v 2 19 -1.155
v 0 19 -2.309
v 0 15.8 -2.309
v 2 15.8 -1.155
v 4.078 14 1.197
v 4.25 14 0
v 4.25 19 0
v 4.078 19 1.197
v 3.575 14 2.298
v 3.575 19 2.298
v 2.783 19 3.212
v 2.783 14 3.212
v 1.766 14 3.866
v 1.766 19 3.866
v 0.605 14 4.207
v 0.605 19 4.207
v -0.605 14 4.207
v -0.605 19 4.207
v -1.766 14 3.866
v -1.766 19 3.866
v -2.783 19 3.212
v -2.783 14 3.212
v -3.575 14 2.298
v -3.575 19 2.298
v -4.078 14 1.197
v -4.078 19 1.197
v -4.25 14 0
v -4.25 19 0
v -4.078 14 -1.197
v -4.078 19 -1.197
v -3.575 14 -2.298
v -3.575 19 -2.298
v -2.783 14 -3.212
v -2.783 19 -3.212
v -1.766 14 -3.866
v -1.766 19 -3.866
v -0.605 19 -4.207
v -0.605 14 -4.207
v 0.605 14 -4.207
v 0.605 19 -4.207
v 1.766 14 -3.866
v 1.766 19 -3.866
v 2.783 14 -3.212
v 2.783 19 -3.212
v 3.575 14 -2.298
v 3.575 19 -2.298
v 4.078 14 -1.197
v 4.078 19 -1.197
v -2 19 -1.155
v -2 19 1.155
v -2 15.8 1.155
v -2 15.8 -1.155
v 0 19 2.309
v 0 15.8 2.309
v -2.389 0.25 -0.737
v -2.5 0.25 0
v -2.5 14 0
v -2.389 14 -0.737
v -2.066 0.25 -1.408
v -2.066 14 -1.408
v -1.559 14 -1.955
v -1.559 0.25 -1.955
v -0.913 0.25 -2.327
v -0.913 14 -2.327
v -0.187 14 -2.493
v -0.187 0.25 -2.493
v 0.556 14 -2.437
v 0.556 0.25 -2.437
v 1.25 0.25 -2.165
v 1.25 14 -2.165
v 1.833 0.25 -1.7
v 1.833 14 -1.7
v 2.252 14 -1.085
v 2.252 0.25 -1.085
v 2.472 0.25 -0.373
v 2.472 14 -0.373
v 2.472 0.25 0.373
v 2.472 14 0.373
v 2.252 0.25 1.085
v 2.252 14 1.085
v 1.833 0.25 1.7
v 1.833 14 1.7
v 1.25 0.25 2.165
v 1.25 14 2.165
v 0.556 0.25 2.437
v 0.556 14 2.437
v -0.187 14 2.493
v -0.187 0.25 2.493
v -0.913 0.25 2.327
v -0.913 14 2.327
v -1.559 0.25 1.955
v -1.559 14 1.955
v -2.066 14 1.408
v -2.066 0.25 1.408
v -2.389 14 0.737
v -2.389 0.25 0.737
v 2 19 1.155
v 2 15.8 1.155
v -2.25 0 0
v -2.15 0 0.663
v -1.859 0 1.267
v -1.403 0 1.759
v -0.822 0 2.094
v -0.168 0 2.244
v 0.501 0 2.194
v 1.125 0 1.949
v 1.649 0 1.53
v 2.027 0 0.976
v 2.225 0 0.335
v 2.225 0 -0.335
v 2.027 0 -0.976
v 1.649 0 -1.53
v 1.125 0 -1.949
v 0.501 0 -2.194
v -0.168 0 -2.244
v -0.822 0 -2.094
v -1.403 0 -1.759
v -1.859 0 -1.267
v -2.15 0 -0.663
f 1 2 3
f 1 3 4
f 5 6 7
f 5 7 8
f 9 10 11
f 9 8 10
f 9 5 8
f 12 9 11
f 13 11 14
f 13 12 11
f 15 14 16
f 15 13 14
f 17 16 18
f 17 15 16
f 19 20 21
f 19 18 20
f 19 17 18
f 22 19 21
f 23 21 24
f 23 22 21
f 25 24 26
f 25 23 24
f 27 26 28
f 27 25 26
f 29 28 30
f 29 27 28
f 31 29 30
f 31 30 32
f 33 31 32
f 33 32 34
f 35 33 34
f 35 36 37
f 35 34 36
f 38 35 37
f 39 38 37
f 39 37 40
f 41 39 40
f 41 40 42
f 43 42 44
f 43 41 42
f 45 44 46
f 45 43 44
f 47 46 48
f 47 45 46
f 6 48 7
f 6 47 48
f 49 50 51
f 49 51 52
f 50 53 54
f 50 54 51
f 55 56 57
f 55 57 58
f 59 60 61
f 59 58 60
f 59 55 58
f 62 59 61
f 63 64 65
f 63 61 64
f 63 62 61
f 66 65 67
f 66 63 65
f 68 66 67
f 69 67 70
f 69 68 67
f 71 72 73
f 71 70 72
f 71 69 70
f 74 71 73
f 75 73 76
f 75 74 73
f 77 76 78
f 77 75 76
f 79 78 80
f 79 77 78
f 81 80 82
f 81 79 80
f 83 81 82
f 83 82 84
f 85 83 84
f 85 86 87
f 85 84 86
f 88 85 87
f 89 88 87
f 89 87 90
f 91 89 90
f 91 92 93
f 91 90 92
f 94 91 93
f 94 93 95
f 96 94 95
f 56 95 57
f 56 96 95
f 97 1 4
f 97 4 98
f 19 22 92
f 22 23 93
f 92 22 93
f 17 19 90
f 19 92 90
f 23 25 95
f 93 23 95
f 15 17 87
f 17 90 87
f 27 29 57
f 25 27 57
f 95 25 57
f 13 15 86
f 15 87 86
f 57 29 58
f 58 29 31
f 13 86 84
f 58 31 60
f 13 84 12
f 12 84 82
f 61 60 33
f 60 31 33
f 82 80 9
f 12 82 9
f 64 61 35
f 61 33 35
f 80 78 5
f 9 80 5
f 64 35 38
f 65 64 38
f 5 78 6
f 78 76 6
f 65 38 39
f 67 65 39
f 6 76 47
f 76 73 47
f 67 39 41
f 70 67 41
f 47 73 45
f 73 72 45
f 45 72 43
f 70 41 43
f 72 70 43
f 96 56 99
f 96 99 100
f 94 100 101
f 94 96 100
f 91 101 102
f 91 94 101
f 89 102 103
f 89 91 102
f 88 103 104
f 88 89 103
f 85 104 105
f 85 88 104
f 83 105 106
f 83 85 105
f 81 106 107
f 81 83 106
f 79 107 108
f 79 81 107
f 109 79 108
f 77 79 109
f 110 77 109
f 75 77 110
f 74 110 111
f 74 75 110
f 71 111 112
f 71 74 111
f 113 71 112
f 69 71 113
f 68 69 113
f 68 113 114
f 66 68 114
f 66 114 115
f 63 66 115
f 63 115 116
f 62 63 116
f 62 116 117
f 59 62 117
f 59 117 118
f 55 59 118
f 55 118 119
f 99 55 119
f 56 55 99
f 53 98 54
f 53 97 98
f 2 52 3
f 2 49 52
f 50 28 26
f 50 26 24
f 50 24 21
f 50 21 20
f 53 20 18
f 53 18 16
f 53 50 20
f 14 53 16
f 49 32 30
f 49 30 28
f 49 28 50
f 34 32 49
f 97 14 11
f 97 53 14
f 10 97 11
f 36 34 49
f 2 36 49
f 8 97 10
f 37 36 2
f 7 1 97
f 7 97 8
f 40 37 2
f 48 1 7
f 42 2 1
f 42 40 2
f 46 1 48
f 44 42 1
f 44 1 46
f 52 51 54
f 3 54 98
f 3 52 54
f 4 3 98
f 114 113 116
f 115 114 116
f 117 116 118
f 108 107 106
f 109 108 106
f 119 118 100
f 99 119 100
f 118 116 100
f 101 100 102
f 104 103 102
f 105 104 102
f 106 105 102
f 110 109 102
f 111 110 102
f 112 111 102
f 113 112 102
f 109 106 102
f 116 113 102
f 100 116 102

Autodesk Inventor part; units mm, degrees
ref_plane "YZ Plane" through (0, 0, 0) normal (1, 0, 0) x (0, 1, 0)
ref_plane "XZ Plane" through (0, 0, 0) normal (0, 1, 0) x (-1, 0, 0)
ref_plane "XY Plane" through (0, 0, 0) normal (0, 0, 1) x (1, 0, 0)
sketch "Sketch1" plane through (0, 0, 0) normal (0, 1, 0) x (-1, 0, 0)
  circle A0 centre (0, 0) radius 2.5
  dimension "d0" = 5
extrude "Extrusion1" add sketch "Sketch1" along normal blind 14
sketch "Sketch2" plane through (0, 14, 0) normal (0, 1, 0) x (1, 0, 0)
  circle A0 centre (0, 0) radius 2.5 projected
  circle A1 centre (0, 0) radius 4.25
  dimension "d3" = 8.5
extrude "Extrusion2" add sketch "Sketch2" along normal blind 5 contours A0 | A1
sketch "Sketch3" plane through (0, 19, 0) normal (0, 1, 0) x (1, 0, 0)
  circle A0 centre (0, 0) radius 4.25 projected
  line L0 (0, 2.3094) -> (2, 1.1547)
  line L1 (2, 1.1547) -> (2, -1.1547)
  line L2 (2, -1.1547) -> (0, -2.3094)
  line L3 (0, -2.3094) -> (-2, -1.1547)
  line L4 (-2, -1.1547) -> (-2, 1.1547)
  line L5 (-2, 1.1547) -> (0, 2.3094)
  dimension "d6" = 2
extrude "Extrusion3" cut sketch "Sketch3" against normal blind 3.2 contours L0 L1 L2 L3 L4 L5
thread "Thread1" size "M5x0.8" class "6g" standard "ANSI Metric M Profile" full length
chamfer "Chamfer1" distance 0.25 angle 45 1 edges at (2.5, 0, 0)
properties part number "M5x14SHCS" material "Stainless Steel"
